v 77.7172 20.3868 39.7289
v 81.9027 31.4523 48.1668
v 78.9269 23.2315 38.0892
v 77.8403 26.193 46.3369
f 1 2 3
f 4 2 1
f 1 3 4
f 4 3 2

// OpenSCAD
// Auto-generated auxetic polyhedron
points = [
    [78.926901, 23.231462, 38.089205],
    [81.902738, 31.452315, 48.166802],
    [77.717245, 20.386785, 39.728880],
    [77.840336, 26.193049, 46.336930],
];

faces = [
    [0, 1, 2],
    [2, 1, 3],
    [3, 0, 2],
    [1, 0, 3],
];

polyhedron(points = points, faces = faces);
